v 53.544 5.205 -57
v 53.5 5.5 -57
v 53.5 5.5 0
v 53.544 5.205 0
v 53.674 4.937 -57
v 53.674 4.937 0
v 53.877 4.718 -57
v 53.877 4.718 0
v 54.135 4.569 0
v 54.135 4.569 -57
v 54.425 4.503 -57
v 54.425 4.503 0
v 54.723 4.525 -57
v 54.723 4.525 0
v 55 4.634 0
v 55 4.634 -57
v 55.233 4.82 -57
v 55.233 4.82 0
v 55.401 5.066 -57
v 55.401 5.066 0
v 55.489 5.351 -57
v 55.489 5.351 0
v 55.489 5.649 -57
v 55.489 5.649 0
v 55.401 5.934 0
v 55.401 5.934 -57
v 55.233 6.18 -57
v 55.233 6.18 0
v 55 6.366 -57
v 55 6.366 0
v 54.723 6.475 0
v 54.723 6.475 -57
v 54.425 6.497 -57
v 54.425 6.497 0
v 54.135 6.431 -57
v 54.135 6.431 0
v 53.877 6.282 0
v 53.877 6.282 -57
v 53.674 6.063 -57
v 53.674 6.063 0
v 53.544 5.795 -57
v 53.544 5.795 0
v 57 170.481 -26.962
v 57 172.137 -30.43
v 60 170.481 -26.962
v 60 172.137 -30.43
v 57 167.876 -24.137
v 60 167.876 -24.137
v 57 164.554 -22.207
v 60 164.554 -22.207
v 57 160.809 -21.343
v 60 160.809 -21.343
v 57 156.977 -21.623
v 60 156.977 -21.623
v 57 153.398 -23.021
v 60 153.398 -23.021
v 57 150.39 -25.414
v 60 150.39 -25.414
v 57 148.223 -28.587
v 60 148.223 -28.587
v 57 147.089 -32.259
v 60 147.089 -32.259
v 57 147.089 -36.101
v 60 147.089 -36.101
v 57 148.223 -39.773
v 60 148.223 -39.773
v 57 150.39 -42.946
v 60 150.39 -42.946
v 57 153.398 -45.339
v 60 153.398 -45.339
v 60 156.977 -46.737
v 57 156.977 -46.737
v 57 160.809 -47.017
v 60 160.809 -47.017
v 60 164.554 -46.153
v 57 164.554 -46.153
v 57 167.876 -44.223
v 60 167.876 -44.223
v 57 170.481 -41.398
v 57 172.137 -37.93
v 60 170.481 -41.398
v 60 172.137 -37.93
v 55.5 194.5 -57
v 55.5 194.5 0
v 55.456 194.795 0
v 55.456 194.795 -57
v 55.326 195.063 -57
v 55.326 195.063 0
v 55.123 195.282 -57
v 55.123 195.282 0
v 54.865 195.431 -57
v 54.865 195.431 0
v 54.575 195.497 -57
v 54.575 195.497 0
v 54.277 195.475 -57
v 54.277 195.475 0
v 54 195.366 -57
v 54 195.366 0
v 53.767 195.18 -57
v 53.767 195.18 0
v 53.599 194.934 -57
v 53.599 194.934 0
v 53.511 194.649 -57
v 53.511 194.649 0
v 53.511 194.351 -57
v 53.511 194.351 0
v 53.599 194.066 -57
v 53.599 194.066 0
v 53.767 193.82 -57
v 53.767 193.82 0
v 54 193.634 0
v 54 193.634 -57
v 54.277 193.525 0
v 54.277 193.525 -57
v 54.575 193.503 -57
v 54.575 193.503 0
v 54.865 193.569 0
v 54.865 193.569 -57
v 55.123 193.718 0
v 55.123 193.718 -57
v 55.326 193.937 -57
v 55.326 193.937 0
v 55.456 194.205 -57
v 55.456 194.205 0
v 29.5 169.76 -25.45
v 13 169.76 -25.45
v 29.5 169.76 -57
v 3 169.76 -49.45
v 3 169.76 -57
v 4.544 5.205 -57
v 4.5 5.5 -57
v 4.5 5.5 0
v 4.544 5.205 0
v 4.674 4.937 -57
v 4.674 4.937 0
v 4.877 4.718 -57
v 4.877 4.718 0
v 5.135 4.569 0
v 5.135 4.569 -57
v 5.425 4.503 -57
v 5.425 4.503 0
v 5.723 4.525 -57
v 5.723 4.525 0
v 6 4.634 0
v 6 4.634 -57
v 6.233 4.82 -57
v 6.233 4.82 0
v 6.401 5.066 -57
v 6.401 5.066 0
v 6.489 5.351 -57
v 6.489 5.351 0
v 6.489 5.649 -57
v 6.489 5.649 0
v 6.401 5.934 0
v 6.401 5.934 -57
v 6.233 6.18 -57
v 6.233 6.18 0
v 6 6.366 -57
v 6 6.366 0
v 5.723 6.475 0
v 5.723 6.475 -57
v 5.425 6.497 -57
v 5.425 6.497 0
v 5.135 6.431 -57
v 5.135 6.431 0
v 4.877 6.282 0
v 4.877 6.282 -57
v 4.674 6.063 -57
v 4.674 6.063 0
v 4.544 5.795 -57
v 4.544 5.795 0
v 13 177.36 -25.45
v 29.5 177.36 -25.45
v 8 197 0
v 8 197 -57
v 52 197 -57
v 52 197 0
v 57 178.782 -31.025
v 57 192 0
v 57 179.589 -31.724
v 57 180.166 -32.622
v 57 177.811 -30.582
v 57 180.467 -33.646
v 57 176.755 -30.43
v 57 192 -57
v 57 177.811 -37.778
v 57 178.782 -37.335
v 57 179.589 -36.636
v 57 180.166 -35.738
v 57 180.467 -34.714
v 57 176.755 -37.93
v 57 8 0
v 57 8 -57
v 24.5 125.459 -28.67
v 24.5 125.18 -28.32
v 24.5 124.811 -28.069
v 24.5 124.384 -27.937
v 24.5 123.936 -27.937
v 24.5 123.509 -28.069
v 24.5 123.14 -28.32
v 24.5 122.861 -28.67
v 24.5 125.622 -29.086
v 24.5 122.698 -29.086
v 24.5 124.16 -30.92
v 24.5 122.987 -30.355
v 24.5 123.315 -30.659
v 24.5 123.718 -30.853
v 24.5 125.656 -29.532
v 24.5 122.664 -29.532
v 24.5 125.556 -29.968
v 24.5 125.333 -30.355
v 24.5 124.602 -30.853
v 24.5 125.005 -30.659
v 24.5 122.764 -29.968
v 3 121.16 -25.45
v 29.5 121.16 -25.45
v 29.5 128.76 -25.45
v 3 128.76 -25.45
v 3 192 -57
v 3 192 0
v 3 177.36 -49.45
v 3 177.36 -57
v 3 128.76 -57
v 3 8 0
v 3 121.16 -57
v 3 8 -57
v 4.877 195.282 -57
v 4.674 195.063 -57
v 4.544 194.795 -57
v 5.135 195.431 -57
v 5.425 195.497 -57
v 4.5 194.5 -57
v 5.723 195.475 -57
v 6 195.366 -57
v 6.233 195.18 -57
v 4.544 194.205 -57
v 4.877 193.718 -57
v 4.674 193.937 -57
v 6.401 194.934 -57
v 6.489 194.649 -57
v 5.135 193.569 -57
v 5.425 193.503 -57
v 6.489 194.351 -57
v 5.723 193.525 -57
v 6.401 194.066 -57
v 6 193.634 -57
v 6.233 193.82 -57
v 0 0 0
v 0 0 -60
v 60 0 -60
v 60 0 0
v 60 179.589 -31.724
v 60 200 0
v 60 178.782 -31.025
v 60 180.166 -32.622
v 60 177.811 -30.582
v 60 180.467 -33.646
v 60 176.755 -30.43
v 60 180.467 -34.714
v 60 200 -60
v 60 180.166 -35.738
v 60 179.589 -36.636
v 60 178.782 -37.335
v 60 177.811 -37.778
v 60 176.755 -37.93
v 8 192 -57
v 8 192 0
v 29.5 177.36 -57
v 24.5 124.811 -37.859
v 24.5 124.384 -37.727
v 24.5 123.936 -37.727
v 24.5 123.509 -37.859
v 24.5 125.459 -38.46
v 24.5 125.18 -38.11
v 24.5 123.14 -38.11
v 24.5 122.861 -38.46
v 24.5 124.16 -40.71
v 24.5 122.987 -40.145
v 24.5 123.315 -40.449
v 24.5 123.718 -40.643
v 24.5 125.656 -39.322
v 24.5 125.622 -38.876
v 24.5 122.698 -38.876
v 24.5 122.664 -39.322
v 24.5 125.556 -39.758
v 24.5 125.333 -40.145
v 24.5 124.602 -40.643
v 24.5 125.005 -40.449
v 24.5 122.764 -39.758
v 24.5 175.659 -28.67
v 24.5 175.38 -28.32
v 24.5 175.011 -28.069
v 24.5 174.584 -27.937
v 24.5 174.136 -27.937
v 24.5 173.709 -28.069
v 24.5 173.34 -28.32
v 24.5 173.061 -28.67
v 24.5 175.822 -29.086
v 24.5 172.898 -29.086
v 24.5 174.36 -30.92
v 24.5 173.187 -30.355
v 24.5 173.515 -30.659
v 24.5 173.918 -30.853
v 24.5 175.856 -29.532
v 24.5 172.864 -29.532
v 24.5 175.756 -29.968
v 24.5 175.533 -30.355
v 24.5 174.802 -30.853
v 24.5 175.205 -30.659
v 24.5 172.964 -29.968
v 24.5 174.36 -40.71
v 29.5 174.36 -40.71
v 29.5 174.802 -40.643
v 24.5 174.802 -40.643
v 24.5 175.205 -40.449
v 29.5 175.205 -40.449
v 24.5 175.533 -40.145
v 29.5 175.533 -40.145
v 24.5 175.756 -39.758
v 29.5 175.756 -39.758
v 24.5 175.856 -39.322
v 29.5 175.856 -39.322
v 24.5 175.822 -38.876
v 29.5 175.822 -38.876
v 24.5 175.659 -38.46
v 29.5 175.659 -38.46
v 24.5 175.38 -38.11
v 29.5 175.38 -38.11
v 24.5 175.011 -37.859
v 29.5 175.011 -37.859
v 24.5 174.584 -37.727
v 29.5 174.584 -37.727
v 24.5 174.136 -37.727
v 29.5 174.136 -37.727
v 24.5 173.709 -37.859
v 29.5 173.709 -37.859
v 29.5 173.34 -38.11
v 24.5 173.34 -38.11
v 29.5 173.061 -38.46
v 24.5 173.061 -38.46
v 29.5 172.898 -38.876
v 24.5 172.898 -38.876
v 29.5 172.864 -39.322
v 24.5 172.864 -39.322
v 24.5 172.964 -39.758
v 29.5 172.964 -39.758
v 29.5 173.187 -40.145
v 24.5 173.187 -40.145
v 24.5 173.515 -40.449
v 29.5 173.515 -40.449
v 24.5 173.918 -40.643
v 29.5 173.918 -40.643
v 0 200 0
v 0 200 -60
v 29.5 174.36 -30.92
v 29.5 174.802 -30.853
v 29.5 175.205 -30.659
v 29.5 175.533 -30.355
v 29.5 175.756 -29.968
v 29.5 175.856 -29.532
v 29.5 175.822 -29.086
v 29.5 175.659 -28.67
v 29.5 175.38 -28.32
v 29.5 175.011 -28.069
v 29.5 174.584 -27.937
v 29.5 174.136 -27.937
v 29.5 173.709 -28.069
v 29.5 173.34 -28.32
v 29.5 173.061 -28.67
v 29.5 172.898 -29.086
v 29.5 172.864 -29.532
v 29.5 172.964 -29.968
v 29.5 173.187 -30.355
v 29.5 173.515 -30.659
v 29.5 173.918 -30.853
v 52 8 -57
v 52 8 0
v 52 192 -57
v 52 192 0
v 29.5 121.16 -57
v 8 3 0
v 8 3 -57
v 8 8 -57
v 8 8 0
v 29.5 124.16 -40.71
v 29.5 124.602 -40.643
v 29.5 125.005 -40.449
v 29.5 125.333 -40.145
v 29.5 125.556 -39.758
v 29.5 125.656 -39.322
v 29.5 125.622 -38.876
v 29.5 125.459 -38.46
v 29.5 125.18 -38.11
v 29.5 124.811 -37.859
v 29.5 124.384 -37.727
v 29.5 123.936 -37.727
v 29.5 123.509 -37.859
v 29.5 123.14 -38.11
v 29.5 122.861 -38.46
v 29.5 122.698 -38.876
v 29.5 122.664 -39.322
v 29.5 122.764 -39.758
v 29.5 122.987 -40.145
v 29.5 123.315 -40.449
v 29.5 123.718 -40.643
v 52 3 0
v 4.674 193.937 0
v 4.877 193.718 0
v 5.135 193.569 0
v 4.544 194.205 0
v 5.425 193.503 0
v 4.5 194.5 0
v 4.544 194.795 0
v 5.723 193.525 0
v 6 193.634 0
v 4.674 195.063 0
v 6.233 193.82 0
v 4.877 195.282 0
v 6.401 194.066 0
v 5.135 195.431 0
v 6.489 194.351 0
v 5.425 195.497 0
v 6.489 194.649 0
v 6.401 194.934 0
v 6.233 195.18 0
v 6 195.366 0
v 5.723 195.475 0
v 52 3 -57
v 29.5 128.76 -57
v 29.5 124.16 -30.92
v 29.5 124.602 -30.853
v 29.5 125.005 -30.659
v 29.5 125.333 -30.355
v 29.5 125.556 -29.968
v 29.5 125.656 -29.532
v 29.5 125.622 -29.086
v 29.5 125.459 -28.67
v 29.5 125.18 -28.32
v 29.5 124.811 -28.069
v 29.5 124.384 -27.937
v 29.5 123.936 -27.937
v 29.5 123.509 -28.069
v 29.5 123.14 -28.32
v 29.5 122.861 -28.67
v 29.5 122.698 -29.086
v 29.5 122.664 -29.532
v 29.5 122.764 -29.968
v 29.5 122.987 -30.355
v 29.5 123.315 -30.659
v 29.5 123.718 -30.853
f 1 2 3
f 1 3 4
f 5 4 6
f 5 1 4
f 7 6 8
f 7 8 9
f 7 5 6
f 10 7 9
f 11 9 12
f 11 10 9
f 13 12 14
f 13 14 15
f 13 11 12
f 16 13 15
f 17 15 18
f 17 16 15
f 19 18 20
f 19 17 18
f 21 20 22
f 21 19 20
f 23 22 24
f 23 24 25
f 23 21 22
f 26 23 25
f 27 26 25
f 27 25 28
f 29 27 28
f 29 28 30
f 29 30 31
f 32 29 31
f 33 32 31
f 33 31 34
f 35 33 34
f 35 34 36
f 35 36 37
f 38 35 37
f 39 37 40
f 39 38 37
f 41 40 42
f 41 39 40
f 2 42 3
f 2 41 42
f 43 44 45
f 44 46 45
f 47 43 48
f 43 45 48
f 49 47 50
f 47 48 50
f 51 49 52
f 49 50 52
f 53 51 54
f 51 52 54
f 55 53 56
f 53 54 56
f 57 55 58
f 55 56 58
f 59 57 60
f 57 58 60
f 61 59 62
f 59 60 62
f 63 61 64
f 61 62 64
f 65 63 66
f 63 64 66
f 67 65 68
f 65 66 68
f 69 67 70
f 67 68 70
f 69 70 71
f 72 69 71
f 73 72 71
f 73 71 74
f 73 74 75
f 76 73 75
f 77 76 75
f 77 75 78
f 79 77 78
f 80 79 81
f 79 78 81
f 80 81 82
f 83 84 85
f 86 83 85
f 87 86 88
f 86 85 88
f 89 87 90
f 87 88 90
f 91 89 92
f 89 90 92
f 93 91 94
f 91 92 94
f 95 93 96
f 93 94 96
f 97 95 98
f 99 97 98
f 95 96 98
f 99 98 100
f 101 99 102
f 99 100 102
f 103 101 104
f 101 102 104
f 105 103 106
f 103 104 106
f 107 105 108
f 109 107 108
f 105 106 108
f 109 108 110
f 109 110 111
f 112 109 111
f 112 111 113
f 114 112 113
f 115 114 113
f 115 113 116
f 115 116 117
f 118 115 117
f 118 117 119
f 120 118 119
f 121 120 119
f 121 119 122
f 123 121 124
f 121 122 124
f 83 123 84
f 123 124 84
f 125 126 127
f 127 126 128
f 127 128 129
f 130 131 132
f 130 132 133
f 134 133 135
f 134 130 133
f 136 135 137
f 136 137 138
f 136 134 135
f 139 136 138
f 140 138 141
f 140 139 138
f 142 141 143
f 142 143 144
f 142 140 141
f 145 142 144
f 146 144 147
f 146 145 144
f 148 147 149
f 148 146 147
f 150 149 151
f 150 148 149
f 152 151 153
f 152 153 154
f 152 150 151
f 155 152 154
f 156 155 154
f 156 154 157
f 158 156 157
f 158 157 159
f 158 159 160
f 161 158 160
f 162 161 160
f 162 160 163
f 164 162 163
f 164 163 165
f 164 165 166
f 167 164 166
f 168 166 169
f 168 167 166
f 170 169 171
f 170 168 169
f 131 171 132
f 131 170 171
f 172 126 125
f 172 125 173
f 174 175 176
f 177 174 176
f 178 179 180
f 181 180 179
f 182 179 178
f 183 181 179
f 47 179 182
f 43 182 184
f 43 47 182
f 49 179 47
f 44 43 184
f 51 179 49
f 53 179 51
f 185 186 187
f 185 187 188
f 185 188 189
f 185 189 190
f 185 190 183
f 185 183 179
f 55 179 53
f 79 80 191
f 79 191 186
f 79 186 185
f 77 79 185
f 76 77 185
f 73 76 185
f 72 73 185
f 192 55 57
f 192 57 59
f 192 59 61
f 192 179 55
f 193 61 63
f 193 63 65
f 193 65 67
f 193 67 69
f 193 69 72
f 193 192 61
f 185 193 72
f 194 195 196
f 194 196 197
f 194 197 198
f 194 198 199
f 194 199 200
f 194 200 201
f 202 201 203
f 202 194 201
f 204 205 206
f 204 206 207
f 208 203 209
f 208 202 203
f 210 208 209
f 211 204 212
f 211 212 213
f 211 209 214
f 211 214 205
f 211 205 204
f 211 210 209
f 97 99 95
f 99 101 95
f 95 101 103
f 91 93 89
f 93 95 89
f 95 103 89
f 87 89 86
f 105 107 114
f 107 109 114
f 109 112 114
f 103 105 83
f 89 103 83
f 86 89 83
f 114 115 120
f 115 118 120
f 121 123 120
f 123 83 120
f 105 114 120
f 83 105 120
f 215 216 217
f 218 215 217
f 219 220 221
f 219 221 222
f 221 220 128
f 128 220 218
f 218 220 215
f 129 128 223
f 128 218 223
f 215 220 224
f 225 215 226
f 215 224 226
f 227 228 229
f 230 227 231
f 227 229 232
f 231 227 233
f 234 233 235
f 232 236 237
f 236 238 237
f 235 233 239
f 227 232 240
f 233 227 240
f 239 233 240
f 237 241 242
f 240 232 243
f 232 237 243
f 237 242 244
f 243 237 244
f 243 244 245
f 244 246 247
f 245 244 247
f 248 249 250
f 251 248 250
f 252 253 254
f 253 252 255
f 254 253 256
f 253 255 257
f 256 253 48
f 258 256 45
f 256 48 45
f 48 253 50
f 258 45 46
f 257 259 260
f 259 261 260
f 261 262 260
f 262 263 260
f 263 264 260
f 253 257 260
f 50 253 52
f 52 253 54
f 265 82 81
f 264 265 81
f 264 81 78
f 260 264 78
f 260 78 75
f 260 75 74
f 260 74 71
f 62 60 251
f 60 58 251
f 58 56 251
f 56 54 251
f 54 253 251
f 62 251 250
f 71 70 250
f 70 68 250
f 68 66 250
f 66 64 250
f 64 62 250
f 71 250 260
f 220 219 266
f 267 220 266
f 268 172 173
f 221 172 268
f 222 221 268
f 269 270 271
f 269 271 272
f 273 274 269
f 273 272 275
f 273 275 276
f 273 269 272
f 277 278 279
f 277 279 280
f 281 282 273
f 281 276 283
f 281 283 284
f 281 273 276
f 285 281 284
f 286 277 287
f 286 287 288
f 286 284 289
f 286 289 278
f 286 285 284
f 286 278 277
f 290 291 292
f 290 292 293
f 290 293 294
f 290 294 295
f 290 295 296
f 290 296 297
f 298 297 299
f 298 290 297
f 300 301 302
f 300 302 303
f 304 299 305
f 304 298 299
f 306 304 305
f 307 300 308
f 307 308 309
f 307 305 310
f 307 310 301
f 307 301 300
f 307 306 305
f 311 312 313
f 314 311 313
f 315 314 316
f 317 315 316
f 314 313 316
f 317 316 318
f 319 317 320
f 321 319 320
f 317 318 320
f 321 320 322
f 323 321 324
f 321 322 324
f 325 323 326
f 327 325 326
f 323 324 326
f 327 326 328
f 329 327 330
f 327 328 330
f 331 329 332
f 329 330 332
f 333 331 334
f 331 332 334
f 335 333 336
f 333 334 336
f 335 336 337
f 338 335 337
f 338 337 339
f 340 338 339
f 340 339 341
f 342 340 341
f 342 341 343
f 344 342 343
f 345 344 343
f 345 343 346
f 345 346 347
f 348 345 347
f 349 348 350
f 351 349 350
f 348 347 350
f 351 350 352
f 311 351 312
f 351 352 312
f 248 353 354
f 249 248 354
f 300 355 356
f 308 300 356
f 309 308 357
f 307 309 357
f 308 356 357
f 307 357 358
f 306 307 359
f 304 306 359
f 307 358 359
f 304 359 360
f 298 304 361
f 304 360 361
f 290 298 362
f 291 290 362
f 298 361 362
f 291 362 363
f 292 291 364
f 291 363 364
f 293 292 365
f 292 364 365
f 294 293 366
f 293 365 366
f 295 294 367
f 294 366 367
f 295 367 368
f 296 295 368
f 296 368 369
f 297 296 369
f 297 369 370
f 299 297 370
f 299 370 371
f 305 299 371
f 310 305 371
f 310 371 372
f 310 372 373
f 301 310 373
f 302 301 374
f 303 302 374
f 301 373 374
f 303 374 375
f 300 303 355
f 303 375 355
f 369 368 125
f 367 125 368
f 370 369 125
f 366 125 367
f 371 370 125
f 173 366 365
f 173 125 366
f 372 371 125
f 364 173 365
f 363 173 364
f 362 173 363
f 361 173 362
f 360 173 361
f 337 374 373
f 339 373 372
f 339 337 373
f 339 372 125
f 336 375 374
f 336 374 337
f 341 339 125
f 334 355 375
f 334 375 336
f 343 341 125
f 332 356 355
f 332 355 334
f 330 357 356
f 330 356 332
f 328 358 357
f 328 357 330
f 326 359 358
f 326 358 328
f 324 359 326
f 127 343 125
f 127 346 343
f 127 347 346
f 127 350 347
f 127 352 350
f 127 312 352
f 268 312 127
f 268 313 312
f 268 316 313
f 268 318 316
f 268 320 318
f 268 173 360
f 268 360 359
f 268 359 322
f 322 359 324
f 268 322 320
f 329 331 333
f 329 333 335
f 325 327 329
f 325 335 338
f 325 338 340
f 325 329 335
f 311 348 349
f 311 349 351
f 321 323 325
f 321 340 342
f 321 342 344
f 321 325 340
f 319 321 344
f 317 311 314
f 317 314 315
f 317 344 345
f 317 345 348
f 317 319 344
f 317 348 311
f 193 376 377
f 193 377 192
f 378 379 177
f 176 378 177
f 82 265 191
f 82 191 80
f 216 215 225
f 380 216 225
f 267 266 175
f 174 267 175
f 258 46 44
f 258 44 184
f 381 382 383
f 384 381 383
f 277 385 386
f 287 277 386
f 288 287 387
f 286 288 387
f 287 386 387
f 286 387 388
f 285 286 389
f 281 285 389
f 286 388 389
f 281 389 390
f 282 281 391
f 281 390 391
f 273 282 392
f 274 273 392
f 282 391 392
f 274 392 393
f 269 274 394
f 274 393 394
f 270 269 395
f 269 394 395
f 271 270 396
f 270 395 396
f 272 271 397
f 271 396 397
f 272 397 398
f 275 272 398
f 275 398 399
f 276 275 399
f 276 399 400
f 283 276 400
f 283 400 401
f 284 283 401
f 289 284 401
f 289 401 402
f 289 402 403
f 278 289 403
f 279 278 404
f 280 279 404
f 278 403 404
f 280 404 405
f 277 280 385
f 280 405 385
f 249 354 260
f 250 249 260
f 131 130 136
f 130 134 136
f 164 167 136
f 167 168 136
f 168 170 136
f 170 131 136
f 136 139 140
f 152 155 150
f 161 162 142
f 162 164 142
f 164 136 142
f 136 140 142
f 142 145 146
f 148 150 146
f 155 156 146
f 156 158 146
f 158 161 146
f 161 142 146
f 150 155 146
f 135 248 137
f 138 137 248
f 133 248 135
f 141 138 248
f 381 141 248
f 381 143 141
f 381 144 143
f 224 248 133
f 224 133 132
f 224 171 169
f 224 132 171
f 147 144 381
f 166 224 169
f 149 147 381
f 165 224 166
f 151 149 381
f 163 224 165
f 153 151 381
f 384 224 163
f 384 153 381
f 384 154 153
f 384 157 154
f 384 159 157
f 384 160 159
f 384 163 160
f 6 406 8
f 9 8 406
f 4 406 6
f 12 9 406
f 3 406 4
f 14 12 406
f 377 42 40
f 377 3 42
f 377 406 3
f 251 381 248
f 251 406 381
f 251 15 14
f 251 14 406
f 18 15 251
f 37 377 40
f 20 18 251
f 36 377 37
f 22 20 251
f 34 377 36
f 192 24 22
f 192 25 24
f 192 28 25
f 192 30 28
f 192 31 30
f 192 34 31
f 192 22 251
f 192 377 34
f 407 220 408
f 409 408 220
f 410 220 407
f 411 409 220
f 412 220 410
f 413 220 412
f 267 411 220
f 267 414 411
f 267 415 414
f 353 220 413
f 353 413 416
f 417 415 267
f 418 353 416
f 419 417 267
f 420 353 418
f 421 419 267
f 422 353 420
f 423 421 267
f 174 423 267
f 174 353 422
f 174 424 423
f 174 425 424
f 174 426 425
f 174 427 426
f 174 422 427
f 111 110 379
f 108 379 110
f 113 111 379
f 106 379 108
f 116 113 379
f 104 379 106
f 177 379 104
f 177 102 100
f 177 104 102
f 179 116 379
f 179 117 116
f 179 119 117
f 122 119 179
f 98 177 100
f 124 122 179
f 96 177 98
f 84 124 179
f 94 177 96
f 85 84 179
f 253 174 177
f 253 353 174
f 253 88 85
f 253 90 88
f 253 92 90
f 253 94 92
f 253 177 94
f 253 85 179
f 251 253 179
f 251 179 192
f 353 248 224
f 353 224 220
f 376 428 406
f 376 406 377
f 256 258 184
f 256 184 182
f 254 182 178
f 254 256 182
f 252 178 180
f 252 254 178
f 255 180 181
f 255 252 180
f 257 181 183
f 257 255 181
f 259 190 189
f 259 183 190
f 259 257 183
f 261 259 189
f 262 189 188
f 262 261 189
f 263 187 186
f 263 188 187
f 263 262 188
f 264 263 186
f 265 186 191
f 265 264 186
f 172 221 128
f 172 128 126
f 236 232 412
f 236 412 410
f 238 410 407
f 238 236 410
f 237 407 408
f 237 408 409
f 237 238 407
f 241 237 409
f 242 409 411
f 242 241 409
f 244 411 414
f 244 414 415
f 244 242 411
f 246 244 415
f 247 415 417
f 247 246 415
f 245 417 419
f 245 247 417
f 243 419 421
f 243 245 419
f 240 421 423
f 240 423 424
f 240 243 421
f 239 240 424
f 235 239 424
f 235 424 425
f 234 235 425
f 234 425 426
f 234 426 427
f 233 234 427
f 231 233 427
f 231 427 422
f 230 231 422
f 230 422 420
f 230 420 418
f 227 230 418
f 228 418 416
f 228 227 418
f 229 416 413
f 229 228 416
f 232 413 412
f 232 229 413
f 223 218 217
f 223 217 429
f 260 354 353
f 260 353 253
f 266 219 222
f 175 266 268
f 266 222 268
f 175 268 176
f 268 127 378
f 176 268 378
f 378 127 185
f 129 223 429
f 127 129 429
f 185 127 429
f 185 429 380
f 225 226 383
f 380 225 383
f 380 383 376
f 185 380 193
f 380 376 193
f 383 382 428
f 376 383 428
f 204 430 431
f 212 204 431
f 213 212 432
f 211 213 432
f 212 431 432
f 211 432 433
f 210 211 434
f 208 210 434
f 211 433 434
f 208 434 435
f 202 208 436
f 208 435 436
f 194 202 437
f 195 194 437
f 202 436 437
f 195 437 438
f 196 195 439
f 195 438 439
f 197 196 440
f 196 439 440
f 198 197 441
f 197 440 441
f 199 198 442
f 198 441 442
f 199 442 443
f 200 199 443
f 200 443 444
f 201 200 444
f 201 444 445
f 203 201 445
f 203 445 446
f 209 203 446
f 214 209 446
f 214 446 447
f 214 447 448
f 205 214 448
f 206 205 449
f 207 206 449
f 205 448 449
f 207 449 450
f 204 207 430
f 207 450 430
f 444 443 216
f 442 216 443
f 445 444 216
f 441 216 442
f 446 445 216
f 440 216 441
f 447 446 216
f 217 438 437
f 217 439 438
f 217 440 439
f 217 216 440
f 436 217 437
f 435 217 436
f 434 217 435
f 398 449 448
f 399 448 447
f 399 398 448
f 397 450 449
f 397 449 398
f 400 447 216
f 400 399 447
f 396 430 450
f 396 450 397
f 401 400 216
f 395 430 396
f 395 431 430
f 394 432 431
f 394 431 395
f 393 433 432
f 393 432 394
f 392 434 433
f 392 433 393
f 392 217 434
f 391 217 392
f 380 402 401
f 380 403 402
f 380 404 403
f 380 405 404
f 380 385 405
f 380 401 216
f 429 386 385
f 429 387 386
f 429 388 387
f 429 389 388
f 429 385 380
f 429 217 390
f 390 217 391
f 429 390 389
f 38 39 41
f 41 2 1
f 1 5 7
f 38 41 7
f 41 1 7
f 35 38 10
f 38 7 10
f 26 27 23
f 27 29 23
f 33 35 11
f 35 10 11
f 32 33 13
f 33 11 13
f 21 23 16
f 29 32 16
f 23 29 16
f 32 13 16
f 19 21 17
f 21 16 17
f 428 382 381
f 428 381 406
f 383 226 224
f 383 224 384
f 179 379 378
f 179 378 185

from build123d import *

# Parameters (mm, degrees)
SZKIC1_W                    = 60
SZKIC1_H                    = 60
DODANIE_WYCI_GNI_CIE1_DEPTH = 200
SKORUPA1_T                  = -3
SZKIC2_W                    = 5
SZKIC2_H                    = 5
SZKIC2_R                    = 1
DODANIE_WYCI_GNI_CIE2_DEPTH = 57
SZKIC4_W                    = 5
SZKIC4_H                    = 5
SZKIC4_R                    = 1
DODANIE_WYCI_GNI_CIE3_DEPTH = 57
SZKIC5_W                    = 5
SZKIC5_H                    = 5
SZKIC5_R                    = 1
DODANIE_WYCI_GNI_CIE4_DEPTH = 57
SZKIC6_W                    = 5
SZKIC6_H                    = 5
SZKIC6_R                    = 1
DODANIE_WYCI_GNI_CIE6_DEPTH = 57
SZKIC9_R                    = 12.875
WYTNIJ_WYCI_GNI_CIE1_DEPTH  = 3
SZKIC10_W                   = 31.55
SZKIC10_H                   = 7.6
DODANIE_WYCI_GNI_CIE7_DEPTH = 26.5
SZKIC13_R                   = 1.5
WYTNIJ_WYCI_GNI_CIE4_DEPTH  = 5
WYTNIJ_WYCI_GNI_CIE7_DEPTH  = 10
SZKIC14_R                   = 1.5
WYTNIJ_WYCI_GNI_CIE8_DEPTH  = 5
WYTNIJ_WYCI_GNI_CIE10_DEPTH = 10


with BuildPart() as part:
    # Szkic1 → Dodanie-wyciągnięcie1 (new body)
    with BuildSketch(Plane(origin=(0, 0, 0), x_dir=(1, 0, 0), z_dir=(0, 1, 0))):
        with Locations((30, 30)):
            Rectangle(SZKIC1_W, SZKIC1_H)
    extrude(amount=DODANIE_WYCI_GNI_CIE1_DEPTH)

    # Skorupa1
    skorupa1_openings = [part.faces().sort_by_distance(p)[0] for p in [
        (30, 100, 0),
    ]]
    offset(amount=SKORUPA1_T, openings=skorupa1_openings, kind=Kind.INTERSECTION)

    # Szkic2 → Dodanie-wyciągnięcie2 (add)
    with BuildSketch(Plane.XY.offset(-57)):
        with Locations((5.5, 194.5)):
            Rectangle(SZKIC2_W, SZKIC2_H)
        with Locations(Location((5.5, 194.5, 0), (0, 0, 180))):
            Circle(SZKIC2_R, mode=Mode.SUBTRACT)
    extrude(amount=DODANIE_WYCI_GNI_CIE2_DEPTH)

    # Szkic4 → Dodanie-wyciągnięcie3 (add)
    with BuildSketch(Plane.XY):
        with Locations((54.5, 194.5)):
            Rectangle(SZKIC4_W, SZKIC4_H)
        with Locations((54.5, 194.5)):
            Circle(SZKIC4_R, mode=Mode.SUBTRACT)
    extrude(amount=-DODANIE_WYCI_GNI_CIE3_DEPTH)

    # Szkic5 → Dodanie-wyciągnięcie4 (add)
    with BuildSketch(Plane.XY.offset(-57)):
        with Locations((5.5, 5.5)):
            Rectangle(SZKIC5_W, SZKIC5_H)
        with Locations(Location((5.5, 5.5, 0), (0, 0, 180))):
            Circle(SZKIC5_R, mode=Mode.SUBTRACT)
    extrude(amount=DODANIE_WYCI_GNI_CIE4_DEPTH)

    # Szkic6 → Dodanie-wyciągnięcie6 (add)
    with BuildSketch(Plane.XY.offset(-57)):
        with Locations((54.5, 5.5)):
            Rectangle(SZKIC6_W, SZKIC6_H)
        with Locations(Location((54.5, 5.5, 0), (0, 0, 180))):
            Circle(SZKIC6_R, mode=Mode.SUBTRACT)
    extrude(amount=DODANIE_WYCI_GNI_CIE6_DEPTH)

    # Szkic9 → Wytnij-wyciągnięcie1 (cut)
    with BuildSketch(Plane(origin=(60, 0, 0), x_dir=(0, 0, -1), z_dir=(1, 0, 0))):
        with Locations((34.18, 159.82)):
            Circle(SZKIC9_R)
    extrude(amount=-WYTNIJ_WYCI_GNI_CIE1_DEPTH, mode=Mode.SUBTRACT)

    # Szkic10 → Dodanie-wyciągnięcie7 (add)
    with BuildSketch(Plane(origin=(3, 0, 0), x_dir=(0, 0, -1), z_dir=(1, 0, 0))):
        with Locations((41.225, 173.56)):
            Rectangle(SZKIC10_W, SZKIC10_H)
        with Locations((41.225, 124.96)):
            Rectangle(SZKIC10_W, SZKIC10_H)
    extrude(amount=DODANIE_WYCI_GNI_CIE7_DEPTH)

    # Szkic13 → Wytnij-wyciągnięcie4 (cut)
    with BuildSketch(Plane(origin=(29.5, 0, 0), x_dir=(0, 0, -1), z_dir=(1, 0, 0))):
        with Locations((39.21, 174.36)):
            Circle(SZKIC13_R)
        with Locations((29.42, 174.36)):
            Circle(SZKIC13_R)
    extrude(amount=-WYTNIJ_WYCI_GNI_CIE4_DEPTH, mode=Mode.SUBTRACT)

    # Szkic15 → Wytnij-wyciągnięcie7 (cut)
    with BuildSketch(Plane(origin=(0, 177.36, 0), x_dir=(1, 0, 0), z_dir=(0, 1, 0))):
        Polygon((13, 25.45), (3, 25.45), (3, 49.45), align=None)
    extrude(amount=-WYTNIJ_WYCI_GNI_CIE7_DEPTH, mode=Mode.SUBTRACT)

    # Szkic14 → Wytnij-wyciągnięcie8 (cut)
    with BuildSketch(Plane(origin=(29.5, 0, 0), x_dir=(0, 0, -1), z_dir=(1, 0, 0))):
        with Locations((39.21, 124.16)):
            Circle(SZKIC14_R)
        with Locations((29.42, 124.16)):
            Circle(SZKIC14_R)
    extrude(amount=-WYTNIJ_WYCI_GNI_CIE8_DEPTH, mode=Mode.SUBTRACT)

    # Szkic17 → Wytnij-wyciągnięcie10 (cut)
    with BuildSketch(Plane(origin=(60, 0, 0), x_dir=(0, 0, -1), z_dir=(1, 0, 0))):
        with BuildLine():
            Line((30.43, 172.445), (30.43, 176.755))
            ThreePointArc((30.43, 176.755), (34.18, 180.505), (37.93, 176.755))
            Line((37.93, 176.755), (37.93, 172.445))
            Line((37.93, 172.445), (37.93, 172.13678225))
            Line((37.93, 172.13678225), (30.43, 172.13678225))
            Line((30.43, 172.13678225), (30.43, 172.445))
        make_face()
    extrude(amount=-WYTNIJ_WYCI_GNI_CIE10_DEPTH, mode=Mode.SUBTRACT)


solid = part.part
